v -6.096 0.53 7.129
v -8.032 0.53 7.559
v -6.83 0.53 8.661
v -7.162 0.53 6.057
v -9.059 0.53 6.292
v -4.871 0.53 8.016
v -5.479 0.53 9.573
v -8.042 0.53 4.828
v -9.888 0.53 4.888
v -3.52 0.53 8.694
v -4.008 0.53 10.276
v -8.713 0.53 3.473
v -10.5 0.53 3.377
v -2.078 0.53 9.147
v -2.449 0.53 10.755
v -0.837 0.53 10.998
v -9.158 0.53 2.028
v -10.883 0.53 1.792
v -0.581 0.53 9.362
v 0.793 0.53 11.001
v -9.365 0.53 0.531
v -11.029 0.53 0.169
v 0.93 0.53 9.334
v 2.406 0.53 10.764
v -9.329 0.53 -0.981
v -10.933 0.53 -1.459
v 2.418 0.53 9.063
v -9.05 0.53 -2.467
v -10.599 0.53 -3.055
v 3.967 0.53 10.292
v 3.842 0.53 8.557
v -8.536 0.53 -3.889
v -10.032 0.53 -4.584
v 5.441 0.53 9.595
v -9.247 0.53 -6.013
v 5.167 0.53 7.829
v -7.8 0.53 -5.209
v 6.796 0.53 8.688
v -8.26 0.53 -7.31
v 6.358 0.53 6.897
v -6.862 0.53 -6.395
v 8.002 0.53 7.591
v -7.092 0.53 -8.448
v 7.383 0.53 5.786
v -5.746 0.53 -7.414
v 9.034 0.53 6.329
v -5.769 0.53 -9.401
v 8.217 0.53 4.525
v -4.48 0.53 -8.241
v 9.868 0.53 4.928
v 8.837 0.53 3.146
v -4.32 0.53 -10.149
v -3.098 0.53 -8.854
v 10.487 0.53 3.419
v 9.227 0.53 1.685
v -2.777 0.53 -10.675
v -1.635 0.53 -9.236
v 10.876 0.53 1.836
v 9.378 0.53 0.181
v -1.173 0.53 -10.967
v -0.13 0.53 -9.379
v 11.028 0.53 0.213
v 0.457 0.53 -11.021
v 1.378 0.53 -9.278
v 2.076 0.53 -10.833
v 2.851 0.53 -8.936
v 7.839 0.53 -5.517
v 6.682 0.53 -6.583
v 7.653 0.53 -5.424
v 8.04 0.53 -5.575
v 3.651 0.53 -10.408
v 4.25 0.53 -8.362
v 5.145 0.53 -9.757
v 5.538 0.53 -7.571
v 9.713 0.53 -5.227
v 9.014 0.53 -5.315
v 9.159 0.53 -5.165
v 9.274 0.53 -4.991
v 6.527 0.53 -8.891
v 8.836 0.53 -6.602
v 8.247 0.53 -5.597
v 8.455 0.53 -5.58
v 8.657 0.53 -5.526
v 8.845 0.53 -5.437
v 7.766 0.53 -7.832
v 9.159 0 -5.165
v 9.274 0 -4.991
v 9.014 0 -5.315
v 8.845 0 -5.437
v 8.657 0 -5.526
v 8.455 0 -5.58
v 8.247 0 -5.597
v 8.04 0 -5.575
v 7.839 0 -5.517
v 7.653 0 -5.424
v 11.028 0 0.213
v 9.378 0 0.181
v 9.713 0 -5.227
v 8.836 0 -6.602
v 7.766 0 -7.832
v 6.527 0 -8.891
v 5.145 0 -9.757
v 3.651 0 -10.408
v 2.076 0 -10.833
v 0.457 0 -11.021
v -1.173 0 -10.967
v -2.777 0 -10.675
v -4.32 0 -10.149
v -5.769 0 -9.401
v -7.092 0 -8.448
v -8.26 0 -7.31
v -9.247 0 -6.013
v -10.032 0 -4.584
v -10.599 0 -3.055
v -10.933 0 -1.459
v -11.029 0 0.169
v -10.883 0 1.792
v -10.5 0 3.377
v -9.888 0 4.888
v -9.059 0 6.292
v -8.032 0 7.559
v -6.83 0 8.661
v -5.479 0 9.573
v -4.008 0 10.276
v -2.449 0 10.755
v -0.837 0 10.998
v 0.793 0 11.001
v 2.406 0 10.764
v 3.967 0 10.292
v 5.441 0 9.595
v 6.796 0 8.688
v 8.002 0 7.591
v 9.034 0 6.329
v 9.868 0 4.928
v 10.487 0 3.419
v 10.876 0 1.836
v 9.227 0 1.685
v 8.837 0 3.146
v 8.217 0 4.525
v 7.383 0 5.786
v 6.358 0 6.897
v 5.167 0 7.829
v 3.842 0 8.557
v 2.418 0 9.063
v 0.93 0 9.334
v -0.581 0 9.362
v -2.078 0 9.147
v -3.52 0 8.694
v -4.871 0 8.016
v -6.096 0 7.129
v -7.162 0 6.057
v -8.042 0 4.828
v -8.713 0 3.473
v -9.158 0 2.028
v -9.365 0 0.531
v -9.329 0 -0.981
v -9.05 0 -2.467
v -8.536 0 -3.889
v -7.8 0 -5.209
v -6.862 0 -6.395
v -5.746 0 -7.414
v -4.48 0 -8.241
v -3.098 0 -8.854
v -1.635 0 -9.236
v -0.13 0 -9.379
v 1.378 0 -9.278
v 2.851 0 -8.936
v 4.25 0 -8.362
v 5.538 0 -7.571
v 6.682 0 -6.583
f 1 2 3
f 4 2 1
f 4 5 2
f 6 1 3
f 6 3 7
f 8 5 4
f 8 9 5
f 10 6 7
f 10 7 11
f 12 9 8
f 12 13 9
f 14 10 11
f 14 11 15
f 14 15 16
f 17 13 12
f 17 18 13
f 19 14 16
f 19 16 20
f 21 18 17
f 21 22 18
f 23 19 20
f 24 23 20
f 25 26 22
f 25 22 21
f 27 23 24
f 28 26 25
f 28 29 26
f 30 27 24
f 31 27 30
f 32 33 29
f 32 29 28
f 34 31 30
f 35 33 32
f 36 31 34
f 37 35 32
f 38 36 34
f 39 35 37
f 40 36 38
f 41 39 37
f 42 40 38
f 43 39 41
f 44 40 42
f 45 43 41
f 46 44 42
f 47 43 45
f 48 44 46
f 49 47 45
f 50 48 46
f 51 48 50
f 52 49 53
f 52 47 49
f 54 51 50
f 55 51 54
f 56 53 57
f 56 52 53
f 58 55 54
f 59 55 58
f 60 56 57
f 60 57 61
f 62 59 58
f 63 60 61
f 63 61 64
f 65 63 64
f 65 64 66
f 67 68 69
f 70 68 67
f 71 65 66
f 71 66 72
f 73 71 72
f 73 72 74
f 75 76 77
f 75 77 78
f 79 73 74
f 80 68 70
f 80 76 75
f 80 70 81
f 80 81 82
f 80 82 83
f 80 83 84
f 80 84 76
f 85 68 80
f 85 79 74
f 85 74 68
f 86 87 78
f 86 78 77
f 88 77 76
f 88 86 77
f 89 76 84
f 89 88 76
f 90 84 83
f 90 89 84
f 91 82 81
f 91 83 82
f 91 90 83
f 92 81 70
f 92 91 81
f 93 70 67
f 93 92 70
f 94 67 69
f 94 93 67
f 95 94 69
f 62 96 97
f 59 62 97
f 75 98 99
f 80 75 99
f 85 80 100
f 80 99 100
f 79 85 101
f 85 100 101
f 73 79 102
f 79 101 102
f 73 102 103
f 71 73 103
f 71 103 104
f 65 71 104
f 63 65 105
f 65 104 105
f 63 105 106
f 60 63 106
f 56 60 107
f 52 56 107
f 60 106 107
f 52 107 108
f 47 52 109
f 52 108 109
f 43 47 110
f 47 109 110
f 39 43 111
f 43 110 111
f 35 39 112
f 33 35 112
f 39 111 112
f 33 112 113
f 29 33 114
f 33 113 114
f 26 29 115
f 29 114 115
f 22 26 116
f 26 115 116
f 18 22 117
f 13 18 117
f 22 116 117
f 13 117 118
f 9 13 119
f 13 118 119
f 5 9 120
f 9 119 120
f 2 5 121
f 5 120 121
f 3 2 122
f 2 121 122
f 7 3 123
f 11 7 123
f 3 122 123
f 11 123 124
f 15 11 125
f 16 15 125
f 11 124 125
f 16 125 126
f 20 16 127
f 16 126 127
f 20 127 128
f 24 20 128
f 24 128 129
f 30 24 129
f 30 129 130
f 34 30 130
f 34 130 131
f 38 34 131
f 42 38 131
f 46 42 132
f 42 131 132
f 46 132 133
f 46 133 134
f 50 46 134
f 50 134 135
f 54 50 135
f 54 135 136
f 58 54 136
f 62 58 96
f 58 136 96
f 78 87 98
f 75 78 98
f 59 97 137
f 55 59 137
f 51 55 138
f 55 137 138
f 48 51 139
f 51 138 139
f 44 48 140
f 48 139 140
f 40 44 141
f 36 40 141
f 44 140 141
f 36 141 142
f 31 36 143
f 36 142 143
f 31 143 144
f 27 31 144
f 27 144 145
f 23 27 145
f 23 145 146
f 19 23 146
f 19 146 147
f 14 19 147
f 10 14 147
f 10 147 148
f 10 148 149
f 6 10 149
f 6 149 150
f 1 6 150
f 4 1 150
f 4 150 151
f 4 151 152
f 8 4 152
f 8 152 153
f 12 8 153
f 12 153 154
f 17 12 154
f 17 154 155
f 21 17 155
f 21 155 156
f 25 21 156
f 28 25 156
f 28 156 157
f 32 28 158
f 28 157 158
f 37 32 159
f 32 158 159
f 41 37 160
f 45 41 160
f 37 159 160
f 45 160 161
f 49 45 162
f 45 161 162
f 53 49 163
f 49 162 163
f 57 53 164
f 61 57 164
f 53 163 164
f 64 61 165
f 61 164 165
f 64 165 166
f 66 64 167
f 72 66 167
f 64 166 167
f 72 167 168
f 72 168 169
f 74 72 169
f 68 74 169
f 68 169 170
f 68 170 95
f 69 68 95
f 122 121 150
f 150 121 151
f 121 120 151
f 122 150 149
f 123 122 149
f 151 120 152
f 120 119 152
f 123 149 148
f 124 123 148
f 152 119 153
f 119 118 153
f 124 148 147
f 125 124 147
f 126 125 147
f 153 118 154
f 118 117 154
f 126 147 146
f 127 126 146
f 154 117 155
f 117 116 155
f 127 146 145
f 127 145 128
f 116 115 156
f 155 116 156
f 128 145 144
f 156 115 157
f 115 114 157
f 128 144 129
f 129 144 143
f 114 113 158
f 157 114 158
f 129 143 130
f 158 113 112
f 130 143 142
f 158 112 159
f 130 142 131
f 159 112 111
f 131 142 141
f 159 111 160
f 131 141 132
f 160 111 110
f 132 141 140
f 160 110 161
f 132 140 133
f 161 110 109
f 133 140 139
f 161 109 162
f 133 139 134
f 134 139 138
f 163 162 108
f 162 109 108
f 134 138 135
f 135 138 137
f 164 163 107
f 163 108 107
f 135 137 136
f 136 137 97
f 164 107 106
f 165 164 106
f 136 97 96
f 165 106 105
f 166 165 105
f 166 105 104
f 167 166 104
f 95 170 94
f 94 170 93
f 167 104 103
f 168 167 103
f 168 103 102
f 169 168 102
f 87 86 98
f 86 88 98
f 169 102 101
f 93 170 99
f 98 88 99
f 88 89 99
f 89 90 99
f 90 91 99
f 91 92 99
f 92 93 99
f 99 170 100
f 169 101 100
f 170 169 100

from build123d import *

# Parameters (mm, degrees)
EXTRUDE_THIN1_DEPTH = 0.53
SKETCH2_R           = 1.151524856
CUT_EXTRUDE1_DEPTH  = 16.607776908


with BuildPart() as part:
    # Sketch1 → Extrude-Thin1 (new body)
    with BuildSketch(Plane(origin=(0, 0, 0), x_dir=(1, 0, 0), z_dir=(0, 1, 0))):
        with BuildLine():
            ThreePointArc((9.712852175, 5.226987912), (-10.721135618, -2.591939635), (11.027949059, -0.212695892))
            Line((11.027949059, -0.212695892), (9.378255864, -0.180878284))
            ThreePointArc((9.378255864, -0.180878284), (-9.117339265, -2.204206144), (8.259886981, 4.445072223))
            Line((8.259886981, 4.445072223), (9.712852175, 5.226987912))
        make_face()
    extrude(amount=EXTRUDE_THIN1_DEPTH)

    # Sketch2 → Cut-Extrude1 (cut, through all)
    with BuildSketch(Plane(origin=(0, 0, 0), x_dir=(1, 0, 0), z_dir=(0, 1, 0))):
        with Locations((8.259886981, 4.445072223)):
            Circle(SKETCH2_R)
    extrude(amount=CUT_EXTRUDE1_DEPTH, mode=Mode.SUBTRACT)


solid = part.part
